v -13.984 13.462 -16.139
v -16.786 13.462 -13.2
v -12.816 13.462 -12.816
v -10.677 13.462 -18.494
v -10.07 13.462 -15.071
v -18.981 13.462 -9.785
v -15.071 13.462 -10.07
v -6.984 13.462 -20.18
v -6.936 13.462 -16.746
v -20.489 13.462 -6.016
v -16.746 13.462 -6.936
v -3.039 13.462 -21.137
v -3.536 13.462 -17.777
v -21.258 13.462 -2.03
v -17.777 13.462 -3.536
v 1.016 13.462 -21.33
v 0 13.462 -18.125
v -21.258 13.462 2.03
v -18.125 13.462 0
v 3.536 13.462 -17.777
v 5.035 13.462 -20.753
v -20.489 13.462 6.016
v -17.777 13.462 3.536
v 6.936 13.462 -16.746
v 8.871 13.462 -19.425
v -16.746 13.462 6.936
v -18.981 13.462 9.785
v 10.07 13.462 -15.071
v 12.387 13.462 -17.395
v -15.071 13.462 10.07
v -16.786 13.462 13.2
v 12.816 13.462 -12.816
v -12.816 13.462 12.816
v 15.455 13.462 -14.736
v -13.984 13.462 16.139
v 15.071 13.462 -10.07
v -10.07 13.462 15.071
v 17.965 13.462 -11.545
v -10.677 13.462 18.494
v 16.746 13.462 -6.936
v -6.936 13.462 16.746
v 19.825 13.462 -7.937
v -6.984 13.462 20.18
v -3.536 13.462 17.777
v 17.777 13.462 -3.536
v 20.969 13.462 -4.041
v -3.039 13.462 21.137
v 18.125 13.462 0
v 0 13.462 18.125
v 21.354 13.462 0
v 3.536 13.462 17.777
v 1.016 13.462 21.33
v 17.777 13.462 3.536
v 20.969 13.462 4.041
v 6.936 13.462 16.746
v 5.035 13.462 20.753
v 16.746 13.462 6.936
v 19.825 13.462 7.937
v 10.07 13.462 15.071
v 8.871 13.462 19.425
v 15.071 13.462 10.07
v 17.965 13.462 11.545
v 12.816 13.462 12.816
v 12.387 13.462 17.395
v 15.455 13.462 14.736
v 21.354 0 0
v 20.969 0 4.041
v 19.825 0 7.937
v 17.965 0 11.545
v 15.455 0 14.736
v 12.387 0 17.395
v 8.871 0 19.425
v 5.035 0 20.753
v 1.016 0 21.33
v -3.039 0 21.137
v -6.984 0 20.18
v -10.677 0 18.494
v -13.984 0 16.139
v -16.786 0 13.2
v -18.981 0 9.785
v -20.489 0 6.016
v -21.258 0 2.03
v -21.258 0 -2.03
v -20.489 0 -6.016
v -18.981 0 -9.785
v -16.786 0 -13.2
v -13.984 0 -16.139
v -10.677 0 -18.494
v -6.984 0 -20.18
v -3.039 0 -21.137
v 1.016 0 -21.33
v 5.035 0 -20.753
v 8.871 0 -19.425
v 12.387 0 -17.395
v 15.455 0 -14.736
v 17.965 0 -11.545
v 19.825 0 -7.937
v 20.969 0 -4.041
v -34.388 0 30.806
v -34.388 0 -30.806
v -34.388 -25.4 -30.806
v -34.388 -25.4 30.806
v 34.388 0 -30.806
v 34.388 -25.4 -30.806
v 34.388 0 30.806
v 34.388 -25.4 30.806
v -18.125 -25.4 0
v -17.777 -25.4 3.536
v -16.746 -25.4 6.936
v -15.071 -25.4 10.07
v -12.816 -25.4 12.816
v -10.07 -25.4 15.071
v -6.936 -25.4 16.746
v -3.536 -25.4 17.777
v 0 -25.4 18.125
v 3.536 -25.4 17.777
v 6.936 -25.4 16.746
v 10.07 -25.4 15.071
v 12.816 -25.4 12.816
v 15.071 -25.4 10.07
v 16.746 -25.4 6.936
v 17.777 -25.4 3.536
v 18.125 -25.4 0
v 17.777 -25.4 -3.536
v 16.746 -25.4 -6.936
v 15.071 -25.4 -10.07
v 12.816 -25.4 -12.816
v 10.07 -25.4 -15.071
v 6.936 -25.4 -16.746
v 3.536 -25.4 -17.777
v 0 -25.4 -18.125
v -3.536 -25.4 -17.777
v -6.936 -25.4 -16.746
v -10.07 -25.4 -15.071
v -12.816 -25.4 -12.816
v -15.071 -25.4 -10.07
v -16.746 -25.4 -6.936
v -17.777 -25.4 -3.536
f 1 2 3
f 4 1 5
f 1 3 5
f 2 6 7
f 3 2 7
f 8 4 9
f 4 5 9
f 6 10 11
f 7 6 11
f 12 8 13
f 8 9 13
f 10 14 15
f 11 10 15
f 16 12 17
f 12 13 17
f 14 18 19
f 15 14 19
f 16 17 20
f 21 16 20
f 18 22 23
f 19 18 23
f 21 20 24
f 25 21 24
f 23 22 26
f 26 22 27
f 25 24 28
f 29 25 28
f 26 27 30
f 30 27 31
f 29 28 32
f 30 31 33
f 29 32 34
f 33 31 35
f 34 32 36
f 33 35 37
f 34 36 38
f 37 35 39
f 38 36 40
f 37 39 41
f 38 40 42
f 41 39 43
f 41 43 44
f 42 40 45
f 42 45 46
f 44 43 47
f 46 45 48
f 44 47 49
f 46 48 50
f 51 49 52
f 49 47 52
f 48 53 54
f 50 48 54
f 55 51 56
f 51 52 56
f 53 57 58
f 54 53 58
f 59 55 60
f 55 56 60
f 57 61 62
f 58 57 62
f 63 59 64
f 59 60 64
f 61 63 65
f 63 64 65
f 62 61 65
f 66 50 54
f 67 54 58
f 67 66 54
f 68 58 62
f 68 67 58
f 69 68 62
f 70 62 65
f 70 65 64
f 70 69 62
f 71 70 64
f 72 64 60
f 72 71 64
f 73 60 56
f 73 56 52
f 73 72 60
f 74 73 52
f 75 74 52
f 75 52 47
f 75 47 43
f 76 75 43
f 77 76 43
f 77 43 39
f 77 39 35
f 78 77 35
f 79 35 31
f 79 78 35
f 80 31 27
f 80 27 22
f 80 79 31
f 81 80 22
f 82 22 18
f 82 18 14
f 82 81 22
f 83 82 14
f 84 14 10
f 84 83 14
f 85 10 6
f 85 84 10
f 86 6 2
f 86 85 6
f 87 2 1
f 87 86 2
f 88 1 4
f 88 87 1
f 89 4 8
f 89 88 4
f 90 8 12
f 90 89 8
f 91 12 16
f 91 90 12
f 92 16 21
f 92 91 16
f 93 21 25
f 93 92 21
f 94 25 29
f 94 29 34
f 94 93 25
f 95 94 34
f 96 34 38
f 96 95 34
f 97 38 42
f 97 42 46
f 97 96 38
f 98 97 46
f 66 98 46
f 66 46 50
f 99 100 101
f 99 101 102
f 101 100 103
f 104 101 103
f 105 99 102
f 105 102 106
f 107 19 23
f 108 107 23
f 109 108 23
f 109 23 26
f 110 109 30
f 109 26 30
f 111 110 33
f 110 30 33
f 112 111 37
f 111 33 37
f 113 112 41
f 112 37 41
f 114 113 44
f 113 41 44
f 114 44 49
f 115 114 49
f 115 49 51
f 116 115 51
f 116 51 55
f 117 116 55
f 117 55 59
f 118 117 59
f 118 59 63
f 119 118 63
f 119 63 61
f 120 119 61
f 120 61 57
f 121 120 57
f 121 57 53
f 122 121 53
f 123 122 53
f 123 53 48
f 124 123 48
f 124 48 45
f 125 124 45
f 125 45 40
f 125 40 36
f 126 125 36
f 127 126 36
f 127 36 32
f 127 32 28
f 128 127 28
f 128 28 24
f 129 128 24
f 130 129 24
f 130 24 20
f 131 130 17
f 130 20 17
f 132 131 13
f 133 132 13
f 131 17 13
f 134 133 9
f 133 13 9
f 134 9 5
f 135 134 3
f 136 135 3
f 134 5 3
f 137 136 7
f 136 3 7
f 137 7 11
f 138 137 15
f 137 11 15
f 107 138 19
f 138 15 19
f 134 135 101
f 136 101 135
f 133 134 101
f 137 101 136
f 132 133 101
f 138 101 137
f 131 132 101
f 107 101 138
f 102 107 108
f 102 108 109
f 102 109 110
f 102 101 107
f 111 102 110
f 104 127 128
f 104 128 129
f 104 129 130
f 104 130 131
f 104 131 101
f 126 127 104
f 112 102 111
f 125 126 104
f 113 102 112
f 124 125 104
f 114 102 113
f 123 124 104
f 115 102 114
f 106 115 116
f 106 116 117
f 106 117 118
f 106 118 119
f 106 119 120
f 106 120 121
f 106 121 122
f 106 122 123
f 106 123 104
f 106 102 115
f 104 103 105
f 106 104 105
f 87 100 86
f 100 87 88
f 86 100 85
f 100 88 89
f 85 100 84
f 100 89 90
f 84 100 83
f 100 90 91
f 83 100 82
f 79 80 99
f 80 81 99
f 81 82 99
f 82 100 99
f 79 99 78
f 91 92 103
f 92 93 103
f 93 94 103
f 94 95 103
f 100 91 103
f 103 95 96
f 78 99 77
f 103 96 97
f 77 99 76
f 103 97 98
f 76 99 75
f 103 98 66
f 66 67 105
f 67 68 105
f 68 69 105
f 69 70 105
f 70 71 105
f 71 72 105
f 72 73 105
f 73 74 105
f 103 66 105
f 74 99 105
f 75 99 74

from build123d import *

# Parameters (mm, degrees)
F0_W     = 68.77514
F0_H     = 61.611074
F1_DEPTH = 25.4
F2_R     = 21.354475
F3_DEPTH = 13.462
F4_R     = 18.12526
F5_DEPTH = 60.452


with BuildPart() as f1:
    # F0 (on Front) → F1 (new body)
    with BuildSketch(Plane.XZ):
        Rectangle(F0_W, F0_H)
    extrude(amount=F1_DEPTH)

    # F2 (on face) → F3 (join)
    with BuildSketch(Plane.XZ):
        Circle(F2_R)
    extrude(amount=-F3_DEPTH)

    # F4 (on face) → F5 (cut)
    with BuildSketch(Plane(origin=(0, 13.462, 0), x_dir=(-1, 0, 0), z_dir=(0, 1, 0))):
        Circle(F4_R)
    extrude(amount=-F5_DEPTH, mode=Mode.SUBTRACT)


solid = f1.part
